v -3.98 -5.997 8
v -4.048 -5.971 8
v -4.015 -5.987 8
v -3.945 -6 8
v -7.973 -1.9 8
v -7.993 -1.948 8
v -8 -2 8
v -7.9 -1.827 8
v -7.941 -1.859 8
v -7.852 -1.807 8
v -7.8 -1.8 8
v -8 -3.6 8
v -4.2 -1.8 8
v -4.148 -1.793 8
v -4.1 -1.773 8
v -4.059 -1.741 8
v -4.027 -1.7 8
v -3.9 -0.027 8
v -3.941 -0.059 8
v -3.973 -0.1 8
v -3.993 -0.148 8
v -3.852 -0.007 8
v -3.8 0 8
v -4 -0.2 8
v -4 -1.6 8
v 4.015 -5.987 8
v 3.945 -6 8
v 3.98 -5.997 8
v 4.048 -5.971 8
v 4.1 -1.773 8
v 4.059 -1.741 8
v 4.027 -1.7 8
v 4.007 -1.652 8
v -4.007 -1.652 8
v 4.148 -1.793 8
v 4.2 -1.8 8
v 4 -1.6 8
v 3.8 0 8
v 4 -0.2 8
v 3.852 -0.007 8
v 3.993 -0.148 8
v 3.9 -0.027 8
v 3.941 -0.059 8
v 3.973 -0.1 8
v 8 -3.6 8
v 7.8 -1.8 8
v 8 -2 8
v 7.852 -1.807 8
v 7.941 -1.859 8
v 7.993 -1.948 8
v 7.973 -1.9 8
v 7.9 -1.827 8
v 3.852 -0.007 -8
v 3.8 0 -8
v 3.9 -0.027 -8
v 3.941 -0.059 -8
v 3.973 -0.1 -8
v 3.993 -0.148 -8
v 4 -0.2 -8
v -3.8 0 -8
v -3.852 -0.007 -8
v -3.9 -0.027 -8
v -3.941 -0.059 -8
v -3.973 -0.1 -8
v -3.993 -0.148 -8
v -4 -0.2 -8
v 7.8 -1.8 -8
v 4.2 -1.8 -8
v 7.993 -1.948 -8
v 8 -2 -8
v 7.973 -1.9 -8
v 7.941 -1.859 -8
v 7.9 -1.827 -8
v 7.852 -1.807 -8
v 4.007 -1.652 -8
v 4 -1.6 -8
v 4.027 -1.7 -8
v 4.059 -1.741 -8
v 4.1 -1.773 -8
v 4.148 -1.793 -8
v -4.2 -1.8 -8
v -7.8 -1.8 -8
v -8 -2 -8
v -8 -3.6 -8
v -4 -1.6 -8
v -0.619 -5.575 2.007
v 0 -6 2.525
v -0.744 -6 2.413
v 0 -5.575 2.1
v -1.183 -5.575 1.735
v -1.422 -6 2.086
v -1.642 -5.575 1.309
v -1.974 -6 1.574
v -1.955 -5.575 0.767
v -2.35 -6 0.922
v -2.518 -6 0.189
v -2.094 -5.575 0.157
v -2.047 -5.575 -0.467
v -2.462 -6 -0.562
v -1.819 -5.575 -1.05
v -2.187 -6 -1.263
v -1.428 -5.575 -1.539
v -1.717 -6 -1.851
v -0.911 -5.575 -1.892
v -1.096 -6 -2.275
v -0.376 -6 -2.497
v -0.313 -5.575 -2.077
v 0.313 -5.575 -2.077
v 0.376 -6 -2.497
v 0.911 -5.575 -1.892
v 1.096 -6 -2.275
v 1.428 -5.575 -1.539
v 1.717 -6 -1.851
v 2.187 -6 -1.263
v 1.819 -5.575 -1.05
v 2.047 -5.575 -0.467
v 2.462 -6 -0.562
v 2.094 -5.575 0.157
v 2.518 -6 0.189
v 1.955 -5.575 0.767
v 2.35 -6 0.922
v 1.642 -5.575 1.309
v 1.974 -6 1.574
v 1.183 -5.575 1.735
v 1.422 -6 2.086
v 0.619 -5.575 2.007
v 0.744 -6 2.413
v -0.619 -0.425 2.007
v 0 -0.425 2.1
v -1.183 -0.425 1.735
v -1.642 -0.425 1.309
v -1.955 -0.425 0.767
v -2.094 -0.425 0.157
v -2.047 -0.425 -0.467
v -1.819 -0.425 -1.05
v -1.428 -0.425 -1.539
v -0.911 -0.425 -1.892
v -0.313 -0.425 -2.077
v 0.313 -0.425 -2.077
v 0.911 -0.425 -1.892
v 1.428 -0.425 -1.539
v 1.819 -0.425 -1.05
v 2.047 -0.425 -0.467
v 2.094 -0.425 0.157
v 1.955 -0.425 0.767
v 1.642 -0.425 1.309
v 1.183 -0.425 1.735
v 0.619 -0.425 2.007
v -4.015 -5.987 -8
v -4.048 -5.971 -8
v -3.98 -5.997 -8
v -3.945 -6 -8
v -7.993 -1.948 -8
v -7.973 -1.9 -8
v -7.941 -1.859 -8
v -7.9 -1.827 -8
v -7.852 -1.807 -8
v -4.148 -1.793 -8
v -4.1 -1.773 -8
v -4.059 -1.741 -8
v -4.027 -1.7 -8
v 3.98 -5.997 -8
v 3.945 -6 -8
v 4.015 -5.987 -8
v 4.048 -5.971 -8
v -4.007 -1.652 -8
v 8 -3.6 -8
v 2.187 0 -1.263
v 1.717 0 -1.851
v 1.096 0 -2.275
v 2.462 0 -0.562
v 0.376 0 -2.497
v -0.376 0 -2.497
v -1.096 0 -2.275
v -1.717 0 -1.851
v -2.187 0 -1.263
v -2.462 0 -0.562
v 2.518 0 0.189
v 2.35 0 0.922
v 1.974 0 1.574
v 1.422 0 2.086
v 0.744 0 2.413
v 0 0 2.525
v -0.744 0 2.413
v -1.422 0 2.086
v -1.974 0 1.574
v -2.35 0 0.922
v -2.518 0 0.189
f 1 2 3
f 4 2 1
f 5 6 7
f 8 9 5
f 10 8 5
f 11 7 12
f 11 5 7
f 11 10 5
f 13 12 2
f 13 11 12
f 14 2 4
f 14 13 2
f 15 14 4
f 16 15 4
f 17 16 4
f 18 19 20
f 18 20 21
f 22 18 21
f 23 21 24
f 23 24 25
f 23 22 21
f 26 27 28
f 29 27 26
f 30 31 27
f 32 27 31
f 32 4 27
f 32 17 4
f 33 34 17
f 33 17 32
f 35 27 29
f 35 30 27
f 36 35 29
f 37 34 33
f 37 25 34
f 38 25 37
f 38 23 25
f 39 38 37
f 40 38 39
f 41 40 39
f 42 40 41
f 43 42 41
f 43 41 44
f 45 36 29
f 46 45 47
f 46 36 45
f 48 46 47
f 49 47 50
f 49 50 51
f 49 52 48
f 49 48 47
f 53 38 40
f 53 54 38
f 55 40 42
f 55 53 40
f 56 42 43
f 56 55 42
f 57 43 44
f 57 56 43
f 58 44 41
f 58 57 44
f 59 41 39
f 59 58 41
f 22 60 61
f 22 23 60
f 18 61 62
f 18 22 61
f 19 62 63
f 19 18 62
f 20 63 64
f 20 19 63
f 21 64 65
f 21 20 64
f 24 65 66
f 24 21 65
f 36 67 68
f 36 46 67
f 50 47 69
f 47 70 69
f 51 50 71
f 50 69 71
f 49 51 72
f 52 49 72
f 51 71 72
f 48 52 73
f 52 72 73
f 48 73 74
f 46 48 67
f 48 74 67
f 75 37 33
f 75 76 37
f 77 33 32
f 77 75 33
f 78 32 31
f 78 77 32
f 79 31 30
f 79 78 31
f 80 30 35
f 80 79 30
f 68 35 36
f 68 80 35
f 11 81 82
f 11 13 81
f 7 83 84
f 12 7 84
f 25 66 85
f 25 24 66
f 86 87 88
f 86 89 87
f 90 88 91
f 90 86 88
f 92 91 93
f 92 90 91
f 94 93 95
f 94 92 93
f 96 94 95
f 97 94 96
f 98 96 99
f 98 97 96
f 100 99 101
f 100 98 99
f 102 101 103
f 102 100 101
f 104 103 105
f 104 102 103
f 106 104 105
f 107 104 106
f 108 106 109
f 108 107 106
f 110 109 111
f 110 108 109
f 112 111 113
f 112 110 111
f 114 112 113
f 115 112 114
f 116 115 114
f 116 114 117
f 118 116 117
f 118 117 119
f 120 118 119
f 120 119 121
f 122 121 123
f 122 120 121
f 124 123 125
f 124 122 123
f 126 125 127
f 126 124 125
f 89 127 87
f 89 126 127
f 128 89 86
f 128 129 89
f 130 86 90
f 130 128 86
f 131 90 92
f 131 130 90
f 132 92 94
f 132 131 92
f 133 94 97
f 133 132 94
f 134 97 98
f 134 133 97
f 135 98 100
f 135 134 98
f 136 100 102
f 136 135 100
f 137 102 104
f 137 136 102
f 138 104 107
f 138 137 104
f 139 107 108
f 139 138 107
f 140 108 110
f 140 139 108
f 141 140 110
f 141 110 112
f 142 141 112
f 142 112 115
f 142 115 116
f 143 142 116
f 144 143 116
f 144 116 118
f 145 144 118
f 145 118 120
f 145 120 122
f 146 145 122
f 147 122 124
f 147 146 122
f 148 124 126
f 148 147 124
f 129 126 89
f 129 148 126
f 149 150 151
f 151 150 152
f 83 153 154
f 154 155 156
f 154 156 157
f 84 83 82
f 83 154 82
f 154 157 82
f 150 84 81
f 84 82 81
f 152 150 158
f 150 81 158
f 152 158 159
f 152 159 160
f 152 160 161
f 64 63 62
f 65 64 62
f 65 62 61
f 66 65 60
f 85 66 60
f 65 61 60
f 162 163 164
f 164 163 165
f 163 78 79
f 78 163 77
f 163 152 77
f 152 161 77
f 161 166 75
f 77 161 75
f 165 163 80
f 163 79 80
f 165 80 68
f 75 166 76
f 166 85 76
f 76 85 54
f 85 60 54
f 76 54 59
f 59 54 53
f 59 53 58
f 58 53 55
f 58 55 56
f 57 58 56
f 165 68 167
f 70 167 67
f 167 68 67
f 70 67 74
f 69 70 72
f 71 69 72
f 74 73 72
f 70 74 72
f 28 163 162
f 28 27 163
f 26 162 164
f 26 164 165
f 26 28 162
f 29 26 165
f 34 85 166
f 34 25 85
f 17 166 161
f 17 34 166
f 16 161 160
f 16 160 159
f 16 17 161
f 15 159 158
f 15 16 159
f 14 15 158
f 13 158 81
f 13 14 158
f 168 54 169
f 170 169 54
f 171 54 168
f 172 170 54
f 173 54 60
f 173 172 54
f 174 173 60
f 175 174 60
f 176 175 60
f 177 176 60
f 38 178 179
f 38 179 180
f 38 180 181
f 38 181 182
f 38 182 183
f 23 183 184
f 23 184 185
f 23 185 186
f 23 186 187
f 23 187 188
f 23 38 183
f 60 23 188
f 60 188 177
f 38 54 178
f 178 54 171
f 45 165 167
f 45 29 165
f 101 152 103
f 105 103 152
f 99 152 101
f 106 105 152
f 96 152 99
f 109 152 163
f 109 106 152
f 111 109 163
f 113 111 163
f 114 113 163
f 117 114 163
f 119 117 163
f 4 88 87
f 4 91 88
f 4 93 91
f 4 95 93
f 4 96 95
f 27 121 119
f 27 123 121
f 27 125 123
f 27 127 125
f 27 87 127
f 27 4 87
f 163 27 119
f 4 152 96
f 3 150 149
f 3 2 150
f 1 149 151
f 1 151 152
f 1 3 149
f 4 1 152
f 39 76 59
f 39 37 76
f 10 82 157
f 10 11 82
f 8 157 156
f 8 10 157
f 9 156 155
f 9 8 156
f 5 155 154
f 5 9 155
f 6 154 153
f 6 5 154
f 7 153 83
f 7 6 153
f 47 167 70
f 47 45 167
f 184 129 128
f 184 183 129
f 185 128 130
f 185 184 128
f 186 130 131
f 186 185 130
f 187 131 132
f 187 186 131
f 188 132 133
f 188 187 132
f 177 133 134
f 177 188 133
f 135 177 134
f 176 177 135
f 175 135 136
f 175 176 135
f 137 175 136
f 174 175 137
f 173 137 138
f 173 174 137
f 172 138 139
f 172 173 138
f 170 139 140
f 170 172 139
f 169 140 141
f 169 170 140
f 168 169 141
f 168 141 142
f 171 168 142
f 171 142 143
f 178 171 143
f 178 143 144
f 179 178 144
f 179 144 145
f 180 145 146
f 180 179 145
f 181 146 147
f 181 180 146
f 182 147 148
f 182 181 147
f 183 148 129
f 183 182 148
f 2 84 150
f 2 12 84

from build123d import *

# Parameters (mm, degrees)
EXTRUDE_1_DEPTH = 8
FILLET_1_R      = 0.2


with BuildPart() as part:
    # Эскиз1 → Бобышка-Вытянуть1 (new body, symmetric)
    with BuildSketch(Plane.XY):
        Polygon((4, 0), (-4, 0), (-4, -1.8), (-8, -1.8), (-8, -3.6), (-4, -6), (4, -6), (8, -3.6), (8, -1.8), (4, -1.8), align=None)
    extrude(amount=EXTRUDE_1_DEPTH, both=True)

    # Эскиз4 → Отверстие обработанное метчиком M52 (revolve, cut)
    with BuildSketch(Plane(origin=(0, 0, 0), x_dir=(0, 0, 1), z_dir=(1, 0, 0))):
        Polygon((0, 0), (0, 6), (2.525, 6), (2.1, 5.575), (2.1, 0.425), (2.525, 0), align=None)
    revolve(axis=Axis((0, 6.35, 0), (0, -1, 0)), mode=Mode.SUBTRACT)

    # Скругление1
    fillet_1_edges = [part.edges().sort_by_distance(p)[0] for p in [
        (-4, 0, 0),
        (4, 0, 0),
        (4, -1.8, 0),
        (8, -1.8, 0),
        (4, -6, 0),
        (-4, -6, 0),
        (-8, -1.8, 0),
        (-4, -1.8, 0),
    ]]
    fillet(fillet_1_edges, radius=FILLET_1_R)


solid = part.part
